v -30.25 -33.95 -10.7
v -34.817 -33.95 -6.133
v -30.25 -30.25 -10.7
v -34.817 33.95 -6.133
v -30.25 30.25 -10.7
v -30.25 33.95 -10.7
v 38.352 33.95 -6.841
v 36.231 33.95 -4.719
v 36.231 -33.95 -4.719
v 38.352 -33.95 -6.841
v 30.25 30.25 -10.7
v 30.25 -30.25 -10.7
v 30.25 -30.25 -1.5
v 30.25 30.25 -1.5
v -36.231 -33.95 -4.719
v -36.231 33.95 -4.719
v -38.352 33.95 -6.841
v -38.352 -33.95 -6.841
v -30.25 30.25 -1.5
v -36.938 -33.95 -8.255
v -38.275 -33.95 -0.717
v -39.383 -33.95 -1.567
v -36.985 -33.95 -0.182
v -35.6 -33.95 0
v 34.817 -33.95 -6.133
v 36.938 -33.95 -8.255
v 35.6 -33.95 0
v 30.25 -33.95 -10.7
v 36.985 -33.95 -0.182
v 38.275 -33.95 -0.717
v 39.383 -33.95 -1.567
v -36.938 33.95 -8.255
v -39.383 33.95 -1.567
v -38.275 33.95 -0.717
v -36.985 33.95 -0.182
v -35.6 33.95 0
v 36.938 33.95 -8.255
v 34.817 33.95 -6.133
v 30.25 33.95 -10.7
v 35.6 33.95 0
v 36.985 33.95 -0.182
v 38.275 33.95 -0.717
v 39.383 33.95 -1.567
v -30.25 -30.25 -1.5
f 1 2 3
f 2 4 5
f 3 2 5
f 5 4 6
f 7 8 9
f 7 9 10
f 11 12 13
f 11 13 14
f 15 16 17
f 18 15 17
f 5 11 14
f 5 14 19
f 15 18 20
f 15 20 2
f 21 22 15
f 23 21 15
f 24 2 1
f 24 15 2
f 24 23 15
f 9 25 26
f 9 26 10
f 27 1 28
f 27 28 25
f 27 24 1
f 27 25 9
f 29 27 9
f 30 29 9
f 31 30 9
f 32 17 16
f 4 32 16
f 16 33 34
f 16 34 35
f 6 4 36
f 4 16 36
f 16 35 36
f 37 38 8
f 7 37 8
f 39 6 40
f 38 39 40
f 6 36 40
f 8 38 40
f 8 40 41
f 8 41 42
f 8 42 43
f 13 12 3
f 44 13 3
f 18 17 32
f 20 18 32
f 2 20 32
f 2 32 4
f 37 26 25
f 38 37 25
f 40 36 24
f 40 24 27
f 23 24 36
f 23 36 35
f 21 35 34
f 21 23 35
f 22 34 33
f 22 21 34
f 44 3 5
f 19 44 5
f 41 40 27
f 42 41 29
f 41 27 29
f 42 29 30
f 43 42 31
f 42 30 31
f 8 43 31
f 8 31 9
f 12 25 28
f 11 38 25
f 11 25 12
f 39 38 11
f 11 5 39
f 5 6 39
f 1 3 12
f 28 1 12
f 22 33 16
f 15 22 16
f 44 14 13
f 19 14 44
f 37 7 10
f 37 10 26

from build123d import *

# Parameters (mm, degrees)
SKETCH_1_W          = 81.9
SKETCH_1_H          = 67.9
EXTRUDE_1_DEPTH     = 10.7
SKETCH_2_W          = 60.5
SKETCH_2_H          = 60.5
CUT_EXTRUDE_1_DEPTH = 9.2
CUT_EXTRUDE_2_REACH = 82.011
CUT_EXTRUDE_4_REACH = 91.242
EXTRUDE_2_DEPTH     = 67.9


with BuildPart() as part:
    # Эскиз1 → Бобышка-Вытянуть1 (new body)
    with BuildSketch(Plane.XY):
        Rectangle(SKETCH_1_W, SKETCH_1_H)
    extrude(amount=-EXTRUDE_1_DEPTH)

    # Эскиз2 → Вырез-Вытянуть1 (cut)
    with BuildSketch(Plane(origin=(0, 0, -10.7), x_dir=(-1, 0, 0), z_dir=(0, 0, -1))):
        Rectangle(SKETCH_2_W, SKETCH_2_H)
    extrude(amount=-CUT_EXTRUDE_1_DEPTH, mode=Mode.SUBTRACT)

    # Эскиз3 → Вырез-Вытянуть2 (cut, up to next)
    with BuildSketch(Plane(origin=(0, 33.95, 0), x_dir=(1, 0, 0), z_dir=(0, 1, 0)), mode=Mode.PRIVATE) as cut_extrude_2_sk1:
        Polygon((-40.95, 0), (-30.25, 10.7), (-40.95, 10.7), align=None)
    cut_extrude_2_tool1 = extrude(cut_extrude_2_sk1.sketch, amount=-CUT_EXTRUDE_2_REACH, mode=Mode.PRIVATE) & part.part
    # Эскиз3 → Вырез-Вытянуть2 (cut, up to next)
    with BuildSketch(Plane(origin=(0, 33.95, 0), x_dir=(1, 0, 0), z_dir=(0, 1, 0)), mode=Mode.PRIVATE) as cut_extrude_2_sk2:
        Polygon((40.95, 10.7), (40.95, 0), (30.25, 10.7), align=None)
    cut_extrude_2_tool2 = extrude(cut_extrude_2_sk2.sketch, amount=-CUT_EXTRUDE_2_REACH, mode=Mode.PRIVATE) & part.part
    add(cut_extrude_2_tool1.solids().sort_by_distance((-37.383333, 33.95, -7.133333))[0], mode=Mode.SUBTRACT)
    add(cut_extrude_2_tool2.solids().sort_by_distance((37.383333, 33.95, -7.133333))[0], mode=Mode.SUBTRACT)

    # Эскиз4 → Вырез-Вытянуть4 (cut, up to next)
    with BuildSketch(Plane(origin=(0, -33.95, -40.95), x_dir=(1, 0, 0), z_dir=(0, 1, 0)), mode=Mode.PRIVATE) as cut_extrude_4_sk1:
        with BuildLine():
            Line((39.383021279, -39.383021279), (40.95, -40.95))
            Line((40.95, -40.95), (35.6, -40.95))
            ThreePointArc((35.6, -40.95), (37.647356363, -40.542755499), (39.383021279, -39.383021279))
        make_face()
    cut_extrude_4_tool1 = extrude(cut_extrude_4_sk1.sketch, amount=CUT_EXTRUDE_4_REACH, mode=Mode.PRIVATE) & part.part
    # Эскиз4 → Вырез-Вытянуть4 (cut, up to next)
    with BuildSketch(Plane(origin=(0, -33.95, -40.95), x_dir=(1, 0, 0), z_dir=(0, 1, 0)), mode=Mode.PRIVATE) as cut_extrude_4_sk2:
        with BuildLine():
            Line((-40.95, -40.95), (-35.6, -40.95))
            ThreePointArc((-35.6, -40.95), (-37.647356363, -40.542755499), (-39.383021279, -39.383021279))
            Line((-39.383021279, -39.383021279), (-40.95, -40.95))
        make_face()
    cut_extrude_4_tool2 = extrude(cut_extrude_4_sk2.sketch, amount=CUT_EXTRUDE_4_REACH, mode=Mode.PRIVATE) & part.part
    add(cut_extrude_4_tool1.solids().sort_by_distance((39.042099, -33.95, -0.482136))[0], mode=Mode.SUBTRACT)
    add(cut_extrude_4_tool2.solids().sort_by_distance((-39.042099, -33.95, -0.482136))[0], mode=Mode.SUBTRACT)

    # Эскиз7 → Бобышка-Вытянуть2 (add)
    with BuildSketch(Plane(origin=(0, 33.95, 0), x_dir=(1, 0, 0), z_dir=(0, 1, 0))):
        Polygon((-38.352044546, 6.840596142), (-36.937830983, 8.254809704), (-34.81651064, 6.13348936), (-36.230724202, 4.719275798), align=None)
        Polygon((36.937830983, 8.254809704), (34.81651064, 6.13348936), (36.230724202, 4.719275798), (38.352044546, 6.840596142), align=None)
    extrude(amount=-EXTRUDE_2_DEPTH)


solid = part.part
